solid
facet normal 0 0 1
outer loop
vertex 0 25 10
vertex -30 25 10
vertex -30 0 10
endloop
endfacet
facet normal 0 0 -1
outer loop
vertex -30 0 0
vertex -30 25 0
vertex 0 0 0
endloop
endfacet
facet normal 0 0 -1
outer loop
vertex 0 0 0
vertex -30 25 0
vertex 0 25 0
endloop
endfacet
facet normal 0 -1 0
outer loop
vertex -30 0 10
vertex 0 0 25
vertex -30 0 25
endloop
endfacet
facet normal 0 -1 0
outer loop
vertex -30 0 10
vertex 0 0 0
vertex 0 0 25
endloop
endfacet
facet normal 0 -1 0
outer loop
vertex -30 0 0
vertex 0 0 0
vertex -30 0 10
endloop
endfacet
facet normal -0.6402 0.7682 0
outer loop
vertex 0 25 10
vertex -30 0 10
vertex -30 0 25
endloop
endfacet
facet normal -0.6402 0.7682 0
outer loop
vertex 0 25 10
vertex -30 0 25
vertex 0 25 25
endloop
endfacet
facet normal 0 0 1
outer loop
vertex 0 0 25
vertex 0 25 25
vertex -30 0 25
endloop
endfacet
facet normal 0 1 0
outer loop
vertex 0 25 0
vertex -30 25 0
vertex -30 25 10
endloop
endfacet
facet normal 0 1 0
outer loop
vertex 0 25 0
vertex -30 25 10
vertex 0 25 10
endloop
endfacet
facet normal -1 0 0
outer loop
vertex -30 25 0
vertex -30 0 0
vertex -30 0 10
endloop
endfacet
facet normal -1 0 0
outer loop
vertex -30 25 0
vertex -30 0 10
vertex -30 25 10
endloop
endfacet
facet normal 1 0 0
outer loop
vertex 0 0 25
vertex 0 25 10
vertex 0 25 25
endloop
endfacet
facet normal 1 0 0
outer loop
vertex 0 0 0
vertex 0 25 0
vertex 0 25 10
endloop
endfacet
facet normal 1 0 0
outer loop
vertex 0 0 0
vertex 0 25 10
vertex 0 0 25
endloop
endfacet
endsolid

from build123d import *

# Parameters (mm, degrees)
SKETCH1_W           = 30
SKETCH1_H           = 25
BOSS_EXTRUDE1_DEPTH = 10
BOSS_EXTRUDE2_DEPTH = 15


with BuildPart() as part:
    # Sketch1 → Boss-Extrude1 (new body)
    with BuildSketch(Plane.XY):
        with Locations((-15, 12.5)):
            Rectangle(SKETCH1_W, SKETCH1_H)
    extrude(amount=BOSS_EXTRUDE1_DEPTH)

    # Sketch2 → Boss-Extrude2 (add)
    with BuildSketch(Plane.XY.offset(10)):
        Polygon((-30, 0), (0, 25), (0, 0), align=None)
    extrude(amount=BOSS_EXTRUDE2_DEPTH)


solid = part.part
